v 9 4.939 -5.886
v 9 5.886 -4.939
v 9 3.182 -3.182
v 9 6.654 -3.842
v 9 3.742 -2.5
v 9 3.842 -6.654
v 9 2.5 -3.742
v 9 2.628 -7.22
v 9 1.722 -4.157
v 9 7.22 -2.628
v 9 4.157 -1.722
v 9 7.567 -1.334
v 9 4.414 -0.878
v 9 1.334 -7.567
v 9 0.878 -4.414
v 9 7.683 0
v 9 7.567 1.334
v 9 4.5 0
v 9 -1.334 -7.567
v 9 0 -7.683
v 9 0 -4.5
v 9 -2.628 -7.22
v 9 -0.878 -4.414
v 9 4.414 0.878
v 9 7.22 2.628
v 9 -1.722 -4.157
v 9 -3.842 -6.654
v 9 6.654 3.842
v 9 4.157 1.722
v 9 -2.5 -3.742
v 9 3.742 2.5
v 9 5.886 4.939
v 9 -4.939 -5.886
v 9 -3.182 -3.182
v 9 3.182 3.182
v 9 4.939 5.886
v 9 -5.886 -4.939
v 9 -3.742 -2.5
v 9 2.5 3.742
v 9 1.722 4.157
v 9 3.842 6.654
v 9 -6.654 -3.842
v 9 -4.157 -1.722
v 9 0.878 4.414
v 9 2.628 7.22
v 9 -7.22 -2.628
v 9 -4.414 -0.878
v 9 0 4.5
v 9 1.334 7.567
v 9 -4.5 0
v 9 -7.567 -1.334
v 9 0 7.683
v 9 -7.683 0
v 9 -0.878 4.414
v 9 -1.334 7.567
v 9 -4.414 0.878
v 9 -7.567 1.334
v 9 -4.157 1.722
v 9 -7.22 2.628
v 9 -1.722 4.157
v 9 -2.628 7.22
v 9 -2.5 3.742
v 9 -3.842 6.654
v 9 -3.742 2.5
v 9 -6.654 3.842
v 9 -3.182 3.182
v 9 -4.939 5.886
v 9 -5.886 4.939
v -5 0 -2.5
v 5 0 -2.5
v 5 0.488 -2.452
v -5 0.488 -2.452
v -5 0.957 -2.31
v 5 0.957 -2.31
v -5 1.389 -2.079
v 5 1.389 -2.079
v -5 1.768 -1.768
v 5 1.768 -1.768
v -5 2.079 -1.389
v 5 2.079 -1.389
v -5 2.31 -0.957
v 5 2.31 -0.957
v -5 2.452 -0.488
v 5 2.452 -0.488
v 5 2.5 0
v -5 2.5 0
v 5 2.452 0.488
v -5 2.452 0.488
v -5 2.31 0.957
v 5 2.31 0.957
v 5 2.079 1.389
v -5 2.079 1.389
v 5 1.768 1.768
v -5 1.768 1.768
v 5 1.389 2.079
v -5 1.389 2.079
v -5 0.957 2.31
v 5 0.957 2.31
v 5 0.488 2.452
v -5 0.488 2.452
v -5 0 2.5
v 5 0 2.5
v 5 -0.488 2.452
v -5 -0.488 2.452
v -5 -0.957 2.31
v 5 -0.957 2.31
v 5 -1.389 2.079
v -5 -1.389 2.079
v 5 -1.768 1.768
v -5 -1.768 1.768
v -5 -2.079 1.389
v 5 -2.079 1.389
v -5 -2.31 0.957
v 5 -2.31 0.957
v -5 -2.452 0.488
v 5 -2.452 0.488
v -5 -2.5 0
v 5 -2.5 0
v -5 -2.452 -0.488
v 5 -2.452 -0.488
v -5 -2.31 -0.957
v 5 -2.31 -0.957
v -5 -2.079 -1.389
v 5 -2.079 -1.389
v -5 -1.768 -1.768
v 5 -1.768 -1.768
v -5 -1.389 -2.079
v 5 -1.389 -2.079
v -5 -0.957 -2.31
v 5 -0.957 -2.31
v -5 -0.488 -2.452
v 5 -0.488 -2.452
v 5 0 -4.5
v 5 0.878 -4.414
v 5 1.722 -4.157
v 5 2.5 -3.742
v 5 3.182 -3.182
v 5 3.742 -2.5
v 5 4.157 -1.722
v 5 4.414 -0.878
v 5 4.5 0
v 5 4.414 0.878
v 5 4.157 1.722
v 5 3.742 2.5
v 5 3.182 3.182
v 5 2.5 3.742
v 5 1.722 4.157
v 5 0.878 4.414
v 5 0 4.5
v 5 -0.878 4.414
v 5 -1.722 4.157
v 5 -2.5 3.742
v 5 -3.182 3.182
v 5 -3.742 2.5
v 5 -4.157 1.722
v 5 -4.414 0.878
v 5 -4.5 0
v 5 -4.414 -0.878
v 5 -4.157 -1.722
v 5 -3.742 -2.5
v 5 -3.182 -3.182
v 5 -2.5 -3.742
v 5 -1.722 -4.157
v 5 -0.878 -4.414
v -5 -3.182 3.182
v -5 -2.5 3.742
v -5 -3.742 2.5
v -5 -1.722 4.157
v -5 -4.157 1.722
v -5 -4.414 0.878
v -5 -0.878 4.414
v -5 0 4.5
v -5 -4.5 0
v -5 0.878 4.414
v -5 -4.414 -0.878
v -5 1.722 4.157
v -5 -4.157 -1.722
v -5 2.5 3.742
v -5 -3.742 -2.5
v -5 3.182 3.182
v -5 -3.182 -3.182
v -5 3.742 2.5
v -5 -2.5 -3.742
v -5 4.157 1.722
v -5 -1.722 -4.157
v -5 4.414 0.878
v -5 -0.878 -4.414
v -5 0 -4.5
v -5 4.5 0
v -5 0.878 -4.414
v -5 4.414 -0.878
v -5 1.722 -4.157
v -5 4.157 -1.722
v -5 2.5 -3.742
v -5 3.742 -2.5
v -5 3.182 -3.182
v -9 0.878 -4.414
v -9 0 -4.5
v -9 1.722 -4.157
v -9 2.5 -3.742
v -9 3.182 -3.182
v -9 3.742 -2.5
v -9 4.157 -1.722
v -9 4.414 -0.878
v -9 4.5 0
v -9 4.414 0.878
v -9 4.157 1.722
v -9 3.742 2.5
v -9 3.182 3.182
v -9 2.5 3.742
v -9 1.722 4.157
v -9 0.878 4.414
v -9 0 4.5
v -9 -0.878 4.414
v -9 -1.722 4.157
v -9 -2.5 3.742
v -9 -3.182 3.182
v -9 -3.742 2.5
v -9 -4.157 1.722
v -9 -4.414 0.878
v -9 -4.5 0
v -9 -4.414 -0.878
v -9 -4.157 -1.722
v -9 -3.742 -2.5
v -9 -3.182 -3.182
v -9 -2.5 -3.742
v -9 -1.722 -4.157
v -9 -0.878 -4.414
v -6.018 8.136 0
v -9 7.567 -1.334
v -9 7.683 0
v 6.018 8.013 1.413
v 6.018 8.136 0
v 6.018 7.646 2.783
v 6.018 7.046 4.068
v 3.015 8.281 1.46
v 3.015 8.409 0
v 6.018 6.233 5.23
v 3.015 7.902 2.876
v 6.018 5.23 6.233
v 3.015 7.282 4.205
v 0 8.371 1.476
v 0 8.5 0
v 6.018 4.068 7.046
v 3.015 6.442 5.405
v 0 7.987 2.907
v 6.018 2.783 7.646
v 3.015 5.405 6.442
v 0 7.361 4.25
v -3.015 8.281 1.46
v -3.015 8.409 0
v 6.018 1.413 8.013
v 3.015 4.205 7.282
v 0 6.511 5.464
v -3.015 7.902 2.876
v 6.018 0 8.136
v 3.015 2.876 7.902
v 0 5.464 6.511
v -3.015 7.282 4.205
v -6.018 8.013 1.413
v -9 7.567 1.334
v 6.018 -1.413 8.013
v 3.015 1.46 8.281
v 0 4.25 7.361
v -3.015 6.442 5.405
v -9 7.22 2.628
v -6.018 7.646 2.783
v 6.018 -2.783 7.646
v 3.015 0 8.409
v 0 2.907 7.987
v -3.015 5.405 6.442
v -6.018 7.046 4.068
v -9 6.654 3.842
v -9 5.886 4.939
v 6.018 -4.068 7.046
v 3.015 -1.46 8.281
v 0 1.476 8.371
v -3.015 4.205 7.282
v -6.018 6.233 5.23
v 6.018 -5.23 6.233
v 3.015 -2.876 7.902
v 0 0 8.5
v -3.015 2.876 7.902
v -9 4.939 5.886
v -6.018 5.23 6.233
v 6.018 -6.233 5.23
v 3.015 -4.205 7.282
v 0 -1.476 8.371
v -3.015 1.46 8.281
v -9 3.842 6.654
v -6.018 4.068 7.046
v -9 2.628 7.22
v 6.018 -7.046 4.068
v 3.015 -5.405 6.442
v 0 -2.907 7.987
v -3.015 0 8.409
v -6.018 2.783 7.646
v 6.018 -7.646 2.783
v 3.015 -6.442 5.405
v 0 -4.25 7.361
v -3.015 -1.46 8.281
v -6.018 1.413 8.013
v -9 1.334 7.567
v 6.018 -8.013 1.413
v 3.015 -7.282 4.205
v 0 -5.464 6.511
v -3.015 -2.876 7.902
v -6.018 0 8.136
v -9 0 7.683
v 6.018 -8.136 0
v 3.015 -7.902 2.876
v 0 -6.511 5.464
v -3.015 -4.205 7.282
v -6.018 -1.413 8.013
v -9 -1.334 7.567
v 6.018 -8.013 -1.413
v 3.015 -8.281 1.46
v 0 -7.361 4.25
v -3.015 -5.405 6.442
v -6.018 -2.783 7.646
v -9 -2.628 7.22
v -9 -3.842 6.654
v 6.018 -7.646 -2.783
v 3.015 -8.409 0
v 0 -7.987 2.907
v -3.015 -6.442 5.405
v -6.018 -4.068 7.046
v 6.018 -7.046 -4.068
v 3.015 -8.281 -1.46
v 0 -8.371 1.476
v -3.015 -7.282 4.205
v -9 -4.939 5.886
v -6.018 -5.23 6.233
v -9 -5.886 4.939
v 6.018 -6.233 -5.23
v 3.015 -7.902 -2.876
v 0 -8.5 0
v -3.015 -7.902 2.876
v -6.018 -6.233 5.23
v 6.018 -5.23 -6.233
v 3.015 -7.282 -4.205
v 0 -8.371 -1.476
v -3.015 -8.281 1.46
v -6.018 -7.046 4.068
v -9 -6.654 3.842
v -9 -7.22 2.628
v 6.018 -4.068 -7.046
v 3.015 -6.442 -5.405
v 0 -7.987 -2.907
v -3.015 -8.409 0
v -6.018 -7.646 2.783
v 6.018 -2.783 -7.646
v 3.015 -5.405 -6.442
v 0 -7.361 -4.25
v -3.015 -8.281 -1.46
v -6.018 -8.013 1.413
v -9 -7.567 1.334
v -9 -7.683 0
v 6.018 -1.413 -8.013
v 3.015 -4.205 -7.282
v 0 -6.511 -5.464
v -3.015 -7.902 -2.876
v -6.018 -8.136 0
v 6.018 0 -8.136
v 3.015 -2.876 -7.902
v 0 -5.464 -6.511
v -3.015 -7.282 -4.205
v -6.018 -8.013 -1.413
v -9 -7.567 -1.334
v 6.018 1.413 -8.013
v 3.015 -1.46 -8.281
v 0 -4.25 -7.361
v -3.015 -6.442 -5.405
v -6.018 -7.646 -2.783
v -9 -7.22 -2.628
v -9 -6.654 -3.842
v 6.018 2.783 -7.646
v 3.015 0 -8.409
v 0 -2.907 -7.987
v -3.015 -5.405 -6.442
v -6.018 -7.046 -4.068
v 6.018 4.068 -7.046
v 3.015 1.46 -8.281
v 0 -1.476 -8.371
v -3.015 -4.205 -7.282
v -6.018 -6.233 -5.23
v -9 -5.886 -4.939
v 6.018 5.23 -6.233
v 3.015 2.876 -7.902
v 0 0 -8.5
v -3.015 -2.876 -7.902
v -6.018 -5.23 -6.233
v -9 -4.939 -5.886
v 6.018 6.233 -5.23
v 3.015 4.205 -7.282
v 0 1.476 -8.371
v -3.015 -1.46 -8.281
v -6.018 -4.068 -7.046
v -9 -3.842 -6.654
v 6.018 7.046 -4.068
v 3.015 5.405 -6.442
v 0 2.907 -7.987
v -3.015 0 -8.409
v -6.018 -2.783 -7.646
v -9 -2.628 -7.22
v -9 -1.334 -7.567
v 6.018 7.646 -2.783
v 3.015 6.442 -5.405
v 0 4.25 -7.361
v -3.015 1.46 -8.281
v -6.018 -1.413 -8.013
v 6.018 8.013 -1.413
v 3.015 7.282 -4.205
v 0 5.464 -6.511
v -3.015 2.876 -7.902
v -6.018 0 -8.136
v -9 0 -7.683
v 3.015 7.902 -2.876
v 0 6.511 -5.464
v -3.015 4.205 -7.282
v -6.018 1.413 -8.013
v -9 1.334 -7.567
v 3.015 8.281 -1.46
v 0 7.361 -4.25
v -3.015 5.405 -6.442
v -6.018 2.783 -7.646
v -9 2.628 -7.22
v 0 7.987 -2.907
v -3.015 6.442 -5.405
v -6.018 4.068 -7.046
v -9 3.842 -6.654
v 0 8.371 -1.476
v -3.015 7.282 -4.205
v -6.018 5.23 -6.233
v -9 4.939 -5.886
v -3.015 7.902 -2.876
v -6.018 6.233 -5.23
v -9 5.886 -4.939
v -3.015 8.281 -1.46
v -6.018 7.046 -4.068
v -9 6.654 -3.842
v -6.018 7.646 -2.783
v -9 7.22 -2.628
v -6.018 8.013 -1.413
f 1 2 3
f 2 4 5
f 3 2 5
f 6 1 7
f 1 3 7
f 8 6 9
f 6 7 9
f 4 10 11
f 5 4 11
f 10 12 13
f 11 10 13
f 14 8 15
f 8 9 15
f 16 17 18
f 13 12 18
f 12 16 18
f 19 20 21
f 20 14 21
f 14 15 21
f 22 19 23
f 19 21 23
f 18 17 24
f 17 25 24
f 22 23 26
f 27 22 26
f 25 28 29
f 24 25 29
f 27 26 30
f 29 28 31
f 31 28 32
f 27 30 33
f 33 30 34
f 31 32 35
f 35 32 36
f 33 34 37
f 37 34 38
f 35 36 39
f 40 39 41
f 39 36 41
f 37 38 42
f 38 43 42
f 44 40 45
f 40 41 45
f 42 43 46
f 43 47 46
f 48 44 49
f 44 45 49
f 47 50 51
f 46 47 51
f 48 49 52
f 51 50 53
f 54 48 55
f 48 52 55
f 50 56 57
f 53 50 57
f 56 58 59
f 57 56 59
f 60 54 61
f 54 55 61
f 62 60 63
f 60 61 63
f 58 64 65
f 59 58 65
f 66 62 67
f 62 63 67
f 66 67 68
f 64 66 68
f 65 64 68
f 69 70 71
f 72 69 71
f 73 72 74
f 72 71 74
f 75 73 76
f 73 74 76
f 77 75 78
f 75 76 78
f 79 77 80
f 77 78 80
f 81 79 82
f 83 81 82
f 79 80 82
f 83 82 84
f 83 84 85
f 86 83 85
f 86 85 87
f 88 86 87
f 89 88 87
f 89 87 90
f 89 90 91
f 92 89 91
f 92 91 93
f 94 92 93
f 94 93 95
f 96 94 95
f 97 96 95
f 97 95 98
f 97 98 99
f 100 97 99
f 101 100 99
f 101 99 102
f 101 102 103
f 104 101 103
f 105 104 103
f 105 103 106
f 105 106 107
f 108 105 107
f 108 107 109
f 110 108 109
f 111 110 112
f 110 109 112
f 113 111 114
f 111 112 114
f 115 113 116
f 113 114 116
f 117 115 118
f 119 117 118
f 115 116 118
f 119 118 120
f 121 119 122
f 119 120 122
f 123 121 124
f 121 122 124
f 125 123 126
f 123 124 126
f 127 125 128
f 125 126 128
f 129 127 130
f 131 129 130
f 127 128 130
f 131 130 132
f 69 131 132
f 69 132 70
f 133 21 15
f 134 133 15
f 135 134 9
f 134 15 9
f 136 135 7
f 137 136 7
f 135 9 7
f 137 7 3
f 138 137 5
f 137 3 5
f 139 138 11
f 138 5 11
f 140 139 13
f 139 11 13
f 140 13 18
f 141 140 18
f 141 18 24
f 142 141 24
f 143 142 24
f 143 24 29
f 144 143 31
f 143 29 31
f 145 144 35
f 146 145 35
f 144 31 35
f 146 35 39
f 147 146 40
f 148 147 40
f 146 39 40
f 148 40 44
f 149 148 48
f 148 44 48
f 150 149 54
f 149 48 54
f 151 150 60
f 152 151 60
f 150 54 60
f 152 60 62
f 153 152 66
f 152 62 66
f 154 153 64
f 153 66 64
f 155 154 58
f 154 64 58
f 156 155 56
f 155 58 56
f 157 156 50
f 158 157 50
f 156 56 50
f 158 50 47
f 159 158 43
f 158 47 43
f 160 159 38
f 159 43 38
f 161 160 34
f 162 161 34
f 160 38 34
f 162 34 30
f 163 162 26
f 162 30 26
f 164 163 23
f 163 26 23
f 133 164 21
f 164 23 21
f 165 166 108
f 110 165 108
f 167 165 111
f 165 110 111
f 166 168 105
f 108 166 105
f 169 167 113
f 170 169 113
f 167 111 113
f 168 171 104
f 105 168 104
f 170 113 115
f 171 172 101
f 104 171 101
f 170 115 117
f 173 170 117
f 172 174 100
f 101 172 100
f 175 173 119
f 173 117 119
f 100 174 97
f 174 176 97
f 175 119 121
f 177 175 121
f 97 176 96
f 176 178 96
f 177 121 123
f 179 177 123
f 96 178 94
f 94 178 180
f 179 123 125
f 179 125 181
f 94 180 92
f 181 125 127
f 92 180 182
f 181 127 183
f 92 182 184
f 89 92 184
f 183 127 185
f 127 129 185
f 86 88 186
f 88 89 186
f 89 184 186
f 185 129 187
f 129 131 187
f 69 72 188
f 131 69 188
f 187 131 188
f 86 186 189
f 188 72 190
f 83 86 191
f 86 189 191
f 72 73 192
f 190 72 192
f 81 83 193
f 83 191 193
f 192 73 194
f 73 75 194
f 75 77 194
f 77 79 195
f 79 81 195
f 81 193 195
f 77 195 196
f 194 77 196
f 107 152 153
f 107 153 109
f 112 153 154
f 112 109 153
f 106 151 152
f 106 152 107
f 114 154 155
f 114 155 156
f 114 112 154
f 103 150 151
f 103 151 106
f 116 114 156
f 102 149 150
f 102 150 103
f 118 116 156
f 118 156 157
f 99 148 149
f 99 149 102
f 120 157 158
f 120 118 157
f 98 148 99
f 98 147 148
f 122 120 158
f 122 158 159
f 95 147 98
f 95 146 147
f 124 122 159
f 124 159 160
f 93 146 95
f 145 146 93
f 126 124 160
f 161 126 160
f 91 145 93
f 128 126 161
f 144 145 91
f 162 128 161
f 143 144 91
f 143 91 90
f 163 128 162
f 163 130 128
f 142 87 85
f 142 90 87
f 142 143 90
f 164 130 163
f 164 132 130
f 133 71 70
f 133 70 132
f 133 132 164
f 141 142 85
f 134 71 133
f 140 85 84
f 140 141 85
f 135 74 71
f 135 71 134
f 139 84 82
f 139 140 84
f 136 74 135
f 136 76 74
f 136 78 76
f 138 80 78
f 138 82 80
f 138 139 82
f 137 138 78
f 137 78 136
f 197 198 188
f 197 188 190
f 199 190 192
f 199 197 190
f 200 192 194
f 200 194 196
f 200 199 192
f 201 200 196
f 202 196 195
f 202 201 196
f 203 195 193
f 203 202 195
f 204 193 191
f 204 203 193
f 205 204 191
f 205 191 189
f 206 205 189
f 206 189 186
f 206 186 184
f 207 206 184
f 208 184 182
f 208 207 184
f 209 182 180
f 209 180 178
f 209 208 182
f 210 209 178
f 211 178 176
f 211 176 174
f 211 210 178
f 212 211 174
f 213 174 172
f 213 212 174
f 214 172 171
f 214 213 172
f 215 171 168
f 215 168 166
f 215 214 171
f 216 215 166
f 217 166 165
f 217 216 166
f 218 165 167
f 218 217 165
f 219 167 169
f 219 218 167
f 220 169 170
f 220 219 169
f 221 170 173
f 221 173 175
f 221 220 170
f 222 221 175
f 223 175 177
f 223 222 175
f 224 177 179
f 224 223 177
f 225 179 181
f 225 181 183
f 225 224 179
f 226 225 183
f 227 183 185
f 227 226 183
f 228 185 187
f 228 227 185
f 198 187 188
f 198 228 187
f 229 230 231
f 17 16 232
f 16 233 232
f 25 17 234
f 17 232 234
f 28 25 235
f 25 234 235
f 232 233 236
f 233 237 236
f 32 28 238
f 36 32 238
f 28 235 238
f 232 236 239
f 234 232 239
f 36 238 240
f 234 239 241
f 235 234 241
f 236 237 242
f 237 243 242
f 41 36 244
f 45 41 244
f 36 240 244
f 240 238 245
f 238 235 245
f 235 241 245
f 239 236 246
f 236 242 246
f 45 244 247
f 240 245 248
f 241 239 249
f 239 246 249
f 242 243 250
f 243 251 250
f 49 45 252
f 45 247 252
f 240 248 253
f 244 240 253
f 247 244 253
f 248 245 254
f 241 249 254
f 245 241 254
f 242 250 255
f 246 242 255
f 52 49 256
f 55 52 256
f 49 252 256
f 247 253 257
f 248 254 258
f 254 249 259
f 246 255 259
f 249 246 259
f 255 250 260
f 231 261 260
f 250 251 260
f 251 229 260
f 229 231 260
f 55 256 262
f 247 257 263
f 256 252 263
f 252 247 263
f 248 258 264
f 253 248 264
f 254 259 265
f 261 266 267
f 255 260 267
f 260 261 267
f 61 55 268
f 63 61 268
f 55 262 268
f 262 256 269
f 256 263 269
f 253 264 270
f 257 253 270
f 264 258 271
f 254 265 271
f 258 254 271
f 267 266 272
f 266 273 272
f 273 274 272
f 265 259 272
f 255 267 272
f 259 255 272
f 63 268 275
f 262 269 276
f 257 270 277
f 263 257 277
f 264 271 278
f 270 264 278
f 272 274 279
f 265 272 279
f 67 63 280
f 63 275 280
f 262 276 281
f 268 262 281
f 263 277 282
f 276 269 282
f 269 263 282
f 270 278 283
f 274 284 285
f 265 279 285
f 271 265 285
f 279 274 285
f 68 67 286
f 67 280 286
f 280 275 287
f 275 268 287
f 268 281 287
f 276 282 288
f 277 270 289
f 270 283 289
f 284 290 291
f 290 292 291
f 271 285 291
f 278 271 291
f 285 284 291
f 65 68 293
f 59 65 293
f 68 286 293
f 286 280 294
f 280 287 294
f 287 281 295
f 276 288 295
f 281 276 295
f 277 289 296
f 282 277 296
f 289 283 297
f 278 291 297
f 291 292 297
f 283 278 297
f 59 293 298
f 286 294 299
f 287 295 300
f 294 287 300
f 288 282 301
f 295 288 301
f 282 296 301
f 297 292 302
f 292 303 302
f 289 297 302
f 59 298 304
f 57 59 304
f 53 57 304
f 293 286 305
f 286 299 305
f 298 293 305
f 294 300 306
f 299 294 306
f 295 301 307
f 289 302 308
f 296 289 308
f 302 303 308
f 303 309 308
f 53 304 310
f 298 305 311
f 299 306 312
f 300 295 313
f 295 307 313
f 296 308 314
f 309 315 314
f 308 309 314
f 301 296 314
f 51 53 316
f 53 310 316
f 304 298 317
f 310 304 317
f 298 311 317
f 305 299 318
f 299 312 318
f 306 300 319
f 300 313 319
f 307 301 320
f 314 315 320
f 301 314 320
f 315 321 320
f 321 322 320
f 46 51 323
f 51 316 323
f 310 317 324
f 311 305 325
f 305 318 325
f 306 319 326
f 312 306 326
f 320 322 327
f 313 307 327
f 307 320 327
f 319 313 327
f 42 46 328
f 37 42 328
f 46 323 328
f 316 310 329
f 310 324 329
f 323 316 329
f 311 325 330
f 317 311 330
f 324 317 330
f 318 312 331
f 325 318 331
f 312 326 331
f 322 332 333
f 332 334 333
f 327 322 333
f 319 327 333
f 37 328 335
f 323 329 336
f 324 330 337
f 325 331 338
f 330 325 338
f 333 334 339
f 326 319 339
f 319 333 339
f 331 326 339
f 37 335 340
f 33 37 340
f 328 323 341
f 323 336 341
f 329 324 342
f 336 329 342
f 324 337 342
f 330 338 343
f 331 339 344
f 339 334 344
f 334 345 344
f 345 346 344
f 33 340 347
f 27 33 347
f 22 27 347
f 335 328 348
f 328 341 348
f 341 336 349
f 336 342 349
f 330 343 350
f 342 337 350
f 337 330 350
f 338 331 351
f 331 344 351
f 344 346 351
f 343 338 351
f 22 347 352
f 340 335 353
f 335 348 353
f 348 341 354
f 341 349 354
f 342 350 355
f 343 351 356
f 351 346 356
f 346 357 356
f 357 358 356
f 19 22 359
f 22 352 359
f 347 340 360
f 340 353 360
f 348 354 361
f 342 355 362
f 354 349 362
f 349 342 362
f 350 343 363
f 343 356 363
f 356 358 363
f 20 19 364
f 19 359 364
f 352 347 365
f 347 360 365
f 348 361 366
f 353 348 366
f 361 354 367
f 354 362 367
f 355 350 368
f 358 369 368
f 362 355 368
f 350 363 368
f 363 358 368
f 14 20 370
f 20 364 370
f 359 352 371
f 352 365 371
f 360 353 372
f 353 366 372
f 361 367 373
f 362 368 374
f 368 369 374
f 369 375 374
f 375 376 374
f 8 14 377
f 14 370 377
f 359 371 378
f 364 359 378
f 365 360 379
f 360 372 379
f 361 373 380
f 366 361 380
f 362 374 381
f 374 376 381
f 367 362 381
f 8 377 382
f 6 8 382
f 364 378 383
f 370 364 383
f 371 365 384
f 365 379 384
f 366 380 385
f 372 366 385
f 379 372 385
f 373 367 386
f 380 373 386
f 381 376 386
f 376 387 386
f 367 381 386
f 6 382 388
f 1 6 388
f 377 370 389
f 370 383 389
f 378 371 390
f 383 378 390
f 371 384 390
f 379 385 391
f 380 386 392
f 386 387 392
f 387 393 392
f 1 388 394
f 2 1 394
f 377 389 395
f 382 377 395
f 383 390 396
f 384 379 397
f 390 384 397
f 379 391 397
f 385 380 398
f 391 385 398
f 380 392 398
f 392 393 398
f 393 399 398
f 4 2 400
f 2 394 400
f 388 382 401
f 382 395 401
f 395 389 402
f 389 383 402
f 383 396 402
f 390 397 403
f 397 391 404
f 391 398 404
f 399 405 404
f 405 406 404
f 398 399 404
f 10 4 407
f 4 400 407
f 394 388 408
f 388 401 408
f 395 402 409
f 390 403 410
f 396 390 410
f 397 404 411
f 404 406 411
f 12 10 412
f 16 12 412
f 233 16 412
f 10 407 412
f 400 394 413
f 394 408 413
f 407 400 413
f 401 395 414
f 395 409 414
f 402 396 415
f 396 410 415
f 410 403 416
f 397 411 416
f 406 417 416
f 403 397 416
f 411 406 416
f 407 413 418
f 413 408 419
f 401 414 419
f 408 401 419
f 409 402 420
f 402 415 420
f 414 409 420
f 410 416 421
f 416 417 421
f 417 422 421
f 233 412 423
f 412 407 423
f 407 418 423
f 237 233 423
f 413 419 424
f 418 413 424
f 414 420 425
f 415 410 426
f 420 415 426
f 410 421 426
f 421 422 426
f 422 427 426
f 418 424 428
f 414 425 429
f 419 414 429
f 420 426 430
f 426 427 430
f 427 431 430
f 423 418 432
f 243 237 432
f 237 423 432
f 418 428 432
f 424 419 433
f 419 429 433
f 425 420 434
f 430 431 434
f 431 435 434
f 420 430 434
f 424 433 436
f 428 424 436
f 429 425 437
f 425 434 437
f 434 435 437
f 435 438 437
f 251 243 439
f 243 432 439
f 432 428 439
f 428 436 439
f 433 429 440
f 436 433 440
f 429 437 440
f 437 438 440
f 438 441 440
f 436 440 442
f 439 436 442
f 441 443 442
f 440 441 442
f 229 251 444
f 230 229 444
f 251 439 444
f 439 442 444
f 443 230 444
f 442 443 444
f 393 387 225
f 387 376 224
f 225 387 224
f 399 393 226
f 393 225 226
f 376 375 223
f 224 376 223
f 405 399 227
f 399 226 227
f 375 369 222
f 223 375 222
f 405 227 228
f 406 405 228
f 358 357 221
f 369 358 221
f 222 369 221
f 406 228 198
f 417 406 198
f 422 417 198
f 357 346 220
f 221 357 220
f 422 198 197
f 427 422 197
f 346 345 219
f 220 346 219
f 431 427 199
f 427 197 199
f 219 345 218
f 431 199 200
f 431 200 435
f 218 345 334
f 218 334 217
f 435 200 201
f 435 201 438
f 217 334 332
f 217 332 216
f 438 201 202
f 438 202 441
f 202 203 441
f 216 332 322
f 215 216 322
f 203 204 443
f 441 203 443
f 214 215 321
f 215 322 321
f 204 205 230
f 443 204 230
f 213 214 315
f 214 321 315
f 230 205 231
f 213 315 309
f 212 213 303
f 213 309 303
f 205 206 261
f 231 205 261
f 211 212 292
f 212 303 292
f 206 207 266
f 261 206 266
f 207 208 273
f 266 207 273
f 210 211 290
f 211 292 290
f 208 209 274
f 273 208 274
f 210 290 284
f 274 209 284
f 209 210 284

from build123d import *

# Parameters (mm, degrees)
SKETCH_2_R          = 2.5
CUT_EXTRUDE_1_DEPTH = 19.0000001
SKETCH_3_R          = 4.5
CUT_EXTRUDE_2_DEPTH = 4


with BuildPart() as part:
    # 草圖1 → 旋轉1 (revolve)
    with BuildSketch(Plane.XY):
        with BuildLine():
            Line((-9, 0), (9, 0))
            Line((9, 0), (9, 7.683330509))
            ThreePointArc((9, 7.683330509), (0, 8.5), (-9, 7.683330509))
            Line((-9, 7.683330509), (-9, 0))
        make_face()
    revolve(axis=Axis((-9, 0, 0), (1, 0, 0)))

    # 草圖2 → 除料-伸長1 (cut, through all)
    with BuildSketch(Plane(origin=(9, 0, 0), x_dir=(0, 0, -1), z_dir=(1, 0, 0))):
        Circle(SKETCH_2_R)
    extrude(amount=-CUT_EXTRUDE_1_DEPTH, mode=Mode.SUBTRACT)

    # 草圖3 → 除料-伸長2 (cut)
    with BuildSketch(Plane(origin=(9, 0, 0), x_dir=(0, 0, -1), z_dir=(1, 0, 0))):
        Circle(SKETCH_3_R)
    cut_extrude_2 = extrude(amount=-CUT_EXTRUDE_2_DEPTH, mode=Mode.SUBTRACT)

    # 鏡射1: 除料-伸長2 across plane
    add(cut_extrude_2.mirror(Plane(origin=(0, 0, 0), x_dir=(0, 0, 1), z_dir=(1, 0, 0))), mode=Mode.SUBTRACT)


solid = part.part
